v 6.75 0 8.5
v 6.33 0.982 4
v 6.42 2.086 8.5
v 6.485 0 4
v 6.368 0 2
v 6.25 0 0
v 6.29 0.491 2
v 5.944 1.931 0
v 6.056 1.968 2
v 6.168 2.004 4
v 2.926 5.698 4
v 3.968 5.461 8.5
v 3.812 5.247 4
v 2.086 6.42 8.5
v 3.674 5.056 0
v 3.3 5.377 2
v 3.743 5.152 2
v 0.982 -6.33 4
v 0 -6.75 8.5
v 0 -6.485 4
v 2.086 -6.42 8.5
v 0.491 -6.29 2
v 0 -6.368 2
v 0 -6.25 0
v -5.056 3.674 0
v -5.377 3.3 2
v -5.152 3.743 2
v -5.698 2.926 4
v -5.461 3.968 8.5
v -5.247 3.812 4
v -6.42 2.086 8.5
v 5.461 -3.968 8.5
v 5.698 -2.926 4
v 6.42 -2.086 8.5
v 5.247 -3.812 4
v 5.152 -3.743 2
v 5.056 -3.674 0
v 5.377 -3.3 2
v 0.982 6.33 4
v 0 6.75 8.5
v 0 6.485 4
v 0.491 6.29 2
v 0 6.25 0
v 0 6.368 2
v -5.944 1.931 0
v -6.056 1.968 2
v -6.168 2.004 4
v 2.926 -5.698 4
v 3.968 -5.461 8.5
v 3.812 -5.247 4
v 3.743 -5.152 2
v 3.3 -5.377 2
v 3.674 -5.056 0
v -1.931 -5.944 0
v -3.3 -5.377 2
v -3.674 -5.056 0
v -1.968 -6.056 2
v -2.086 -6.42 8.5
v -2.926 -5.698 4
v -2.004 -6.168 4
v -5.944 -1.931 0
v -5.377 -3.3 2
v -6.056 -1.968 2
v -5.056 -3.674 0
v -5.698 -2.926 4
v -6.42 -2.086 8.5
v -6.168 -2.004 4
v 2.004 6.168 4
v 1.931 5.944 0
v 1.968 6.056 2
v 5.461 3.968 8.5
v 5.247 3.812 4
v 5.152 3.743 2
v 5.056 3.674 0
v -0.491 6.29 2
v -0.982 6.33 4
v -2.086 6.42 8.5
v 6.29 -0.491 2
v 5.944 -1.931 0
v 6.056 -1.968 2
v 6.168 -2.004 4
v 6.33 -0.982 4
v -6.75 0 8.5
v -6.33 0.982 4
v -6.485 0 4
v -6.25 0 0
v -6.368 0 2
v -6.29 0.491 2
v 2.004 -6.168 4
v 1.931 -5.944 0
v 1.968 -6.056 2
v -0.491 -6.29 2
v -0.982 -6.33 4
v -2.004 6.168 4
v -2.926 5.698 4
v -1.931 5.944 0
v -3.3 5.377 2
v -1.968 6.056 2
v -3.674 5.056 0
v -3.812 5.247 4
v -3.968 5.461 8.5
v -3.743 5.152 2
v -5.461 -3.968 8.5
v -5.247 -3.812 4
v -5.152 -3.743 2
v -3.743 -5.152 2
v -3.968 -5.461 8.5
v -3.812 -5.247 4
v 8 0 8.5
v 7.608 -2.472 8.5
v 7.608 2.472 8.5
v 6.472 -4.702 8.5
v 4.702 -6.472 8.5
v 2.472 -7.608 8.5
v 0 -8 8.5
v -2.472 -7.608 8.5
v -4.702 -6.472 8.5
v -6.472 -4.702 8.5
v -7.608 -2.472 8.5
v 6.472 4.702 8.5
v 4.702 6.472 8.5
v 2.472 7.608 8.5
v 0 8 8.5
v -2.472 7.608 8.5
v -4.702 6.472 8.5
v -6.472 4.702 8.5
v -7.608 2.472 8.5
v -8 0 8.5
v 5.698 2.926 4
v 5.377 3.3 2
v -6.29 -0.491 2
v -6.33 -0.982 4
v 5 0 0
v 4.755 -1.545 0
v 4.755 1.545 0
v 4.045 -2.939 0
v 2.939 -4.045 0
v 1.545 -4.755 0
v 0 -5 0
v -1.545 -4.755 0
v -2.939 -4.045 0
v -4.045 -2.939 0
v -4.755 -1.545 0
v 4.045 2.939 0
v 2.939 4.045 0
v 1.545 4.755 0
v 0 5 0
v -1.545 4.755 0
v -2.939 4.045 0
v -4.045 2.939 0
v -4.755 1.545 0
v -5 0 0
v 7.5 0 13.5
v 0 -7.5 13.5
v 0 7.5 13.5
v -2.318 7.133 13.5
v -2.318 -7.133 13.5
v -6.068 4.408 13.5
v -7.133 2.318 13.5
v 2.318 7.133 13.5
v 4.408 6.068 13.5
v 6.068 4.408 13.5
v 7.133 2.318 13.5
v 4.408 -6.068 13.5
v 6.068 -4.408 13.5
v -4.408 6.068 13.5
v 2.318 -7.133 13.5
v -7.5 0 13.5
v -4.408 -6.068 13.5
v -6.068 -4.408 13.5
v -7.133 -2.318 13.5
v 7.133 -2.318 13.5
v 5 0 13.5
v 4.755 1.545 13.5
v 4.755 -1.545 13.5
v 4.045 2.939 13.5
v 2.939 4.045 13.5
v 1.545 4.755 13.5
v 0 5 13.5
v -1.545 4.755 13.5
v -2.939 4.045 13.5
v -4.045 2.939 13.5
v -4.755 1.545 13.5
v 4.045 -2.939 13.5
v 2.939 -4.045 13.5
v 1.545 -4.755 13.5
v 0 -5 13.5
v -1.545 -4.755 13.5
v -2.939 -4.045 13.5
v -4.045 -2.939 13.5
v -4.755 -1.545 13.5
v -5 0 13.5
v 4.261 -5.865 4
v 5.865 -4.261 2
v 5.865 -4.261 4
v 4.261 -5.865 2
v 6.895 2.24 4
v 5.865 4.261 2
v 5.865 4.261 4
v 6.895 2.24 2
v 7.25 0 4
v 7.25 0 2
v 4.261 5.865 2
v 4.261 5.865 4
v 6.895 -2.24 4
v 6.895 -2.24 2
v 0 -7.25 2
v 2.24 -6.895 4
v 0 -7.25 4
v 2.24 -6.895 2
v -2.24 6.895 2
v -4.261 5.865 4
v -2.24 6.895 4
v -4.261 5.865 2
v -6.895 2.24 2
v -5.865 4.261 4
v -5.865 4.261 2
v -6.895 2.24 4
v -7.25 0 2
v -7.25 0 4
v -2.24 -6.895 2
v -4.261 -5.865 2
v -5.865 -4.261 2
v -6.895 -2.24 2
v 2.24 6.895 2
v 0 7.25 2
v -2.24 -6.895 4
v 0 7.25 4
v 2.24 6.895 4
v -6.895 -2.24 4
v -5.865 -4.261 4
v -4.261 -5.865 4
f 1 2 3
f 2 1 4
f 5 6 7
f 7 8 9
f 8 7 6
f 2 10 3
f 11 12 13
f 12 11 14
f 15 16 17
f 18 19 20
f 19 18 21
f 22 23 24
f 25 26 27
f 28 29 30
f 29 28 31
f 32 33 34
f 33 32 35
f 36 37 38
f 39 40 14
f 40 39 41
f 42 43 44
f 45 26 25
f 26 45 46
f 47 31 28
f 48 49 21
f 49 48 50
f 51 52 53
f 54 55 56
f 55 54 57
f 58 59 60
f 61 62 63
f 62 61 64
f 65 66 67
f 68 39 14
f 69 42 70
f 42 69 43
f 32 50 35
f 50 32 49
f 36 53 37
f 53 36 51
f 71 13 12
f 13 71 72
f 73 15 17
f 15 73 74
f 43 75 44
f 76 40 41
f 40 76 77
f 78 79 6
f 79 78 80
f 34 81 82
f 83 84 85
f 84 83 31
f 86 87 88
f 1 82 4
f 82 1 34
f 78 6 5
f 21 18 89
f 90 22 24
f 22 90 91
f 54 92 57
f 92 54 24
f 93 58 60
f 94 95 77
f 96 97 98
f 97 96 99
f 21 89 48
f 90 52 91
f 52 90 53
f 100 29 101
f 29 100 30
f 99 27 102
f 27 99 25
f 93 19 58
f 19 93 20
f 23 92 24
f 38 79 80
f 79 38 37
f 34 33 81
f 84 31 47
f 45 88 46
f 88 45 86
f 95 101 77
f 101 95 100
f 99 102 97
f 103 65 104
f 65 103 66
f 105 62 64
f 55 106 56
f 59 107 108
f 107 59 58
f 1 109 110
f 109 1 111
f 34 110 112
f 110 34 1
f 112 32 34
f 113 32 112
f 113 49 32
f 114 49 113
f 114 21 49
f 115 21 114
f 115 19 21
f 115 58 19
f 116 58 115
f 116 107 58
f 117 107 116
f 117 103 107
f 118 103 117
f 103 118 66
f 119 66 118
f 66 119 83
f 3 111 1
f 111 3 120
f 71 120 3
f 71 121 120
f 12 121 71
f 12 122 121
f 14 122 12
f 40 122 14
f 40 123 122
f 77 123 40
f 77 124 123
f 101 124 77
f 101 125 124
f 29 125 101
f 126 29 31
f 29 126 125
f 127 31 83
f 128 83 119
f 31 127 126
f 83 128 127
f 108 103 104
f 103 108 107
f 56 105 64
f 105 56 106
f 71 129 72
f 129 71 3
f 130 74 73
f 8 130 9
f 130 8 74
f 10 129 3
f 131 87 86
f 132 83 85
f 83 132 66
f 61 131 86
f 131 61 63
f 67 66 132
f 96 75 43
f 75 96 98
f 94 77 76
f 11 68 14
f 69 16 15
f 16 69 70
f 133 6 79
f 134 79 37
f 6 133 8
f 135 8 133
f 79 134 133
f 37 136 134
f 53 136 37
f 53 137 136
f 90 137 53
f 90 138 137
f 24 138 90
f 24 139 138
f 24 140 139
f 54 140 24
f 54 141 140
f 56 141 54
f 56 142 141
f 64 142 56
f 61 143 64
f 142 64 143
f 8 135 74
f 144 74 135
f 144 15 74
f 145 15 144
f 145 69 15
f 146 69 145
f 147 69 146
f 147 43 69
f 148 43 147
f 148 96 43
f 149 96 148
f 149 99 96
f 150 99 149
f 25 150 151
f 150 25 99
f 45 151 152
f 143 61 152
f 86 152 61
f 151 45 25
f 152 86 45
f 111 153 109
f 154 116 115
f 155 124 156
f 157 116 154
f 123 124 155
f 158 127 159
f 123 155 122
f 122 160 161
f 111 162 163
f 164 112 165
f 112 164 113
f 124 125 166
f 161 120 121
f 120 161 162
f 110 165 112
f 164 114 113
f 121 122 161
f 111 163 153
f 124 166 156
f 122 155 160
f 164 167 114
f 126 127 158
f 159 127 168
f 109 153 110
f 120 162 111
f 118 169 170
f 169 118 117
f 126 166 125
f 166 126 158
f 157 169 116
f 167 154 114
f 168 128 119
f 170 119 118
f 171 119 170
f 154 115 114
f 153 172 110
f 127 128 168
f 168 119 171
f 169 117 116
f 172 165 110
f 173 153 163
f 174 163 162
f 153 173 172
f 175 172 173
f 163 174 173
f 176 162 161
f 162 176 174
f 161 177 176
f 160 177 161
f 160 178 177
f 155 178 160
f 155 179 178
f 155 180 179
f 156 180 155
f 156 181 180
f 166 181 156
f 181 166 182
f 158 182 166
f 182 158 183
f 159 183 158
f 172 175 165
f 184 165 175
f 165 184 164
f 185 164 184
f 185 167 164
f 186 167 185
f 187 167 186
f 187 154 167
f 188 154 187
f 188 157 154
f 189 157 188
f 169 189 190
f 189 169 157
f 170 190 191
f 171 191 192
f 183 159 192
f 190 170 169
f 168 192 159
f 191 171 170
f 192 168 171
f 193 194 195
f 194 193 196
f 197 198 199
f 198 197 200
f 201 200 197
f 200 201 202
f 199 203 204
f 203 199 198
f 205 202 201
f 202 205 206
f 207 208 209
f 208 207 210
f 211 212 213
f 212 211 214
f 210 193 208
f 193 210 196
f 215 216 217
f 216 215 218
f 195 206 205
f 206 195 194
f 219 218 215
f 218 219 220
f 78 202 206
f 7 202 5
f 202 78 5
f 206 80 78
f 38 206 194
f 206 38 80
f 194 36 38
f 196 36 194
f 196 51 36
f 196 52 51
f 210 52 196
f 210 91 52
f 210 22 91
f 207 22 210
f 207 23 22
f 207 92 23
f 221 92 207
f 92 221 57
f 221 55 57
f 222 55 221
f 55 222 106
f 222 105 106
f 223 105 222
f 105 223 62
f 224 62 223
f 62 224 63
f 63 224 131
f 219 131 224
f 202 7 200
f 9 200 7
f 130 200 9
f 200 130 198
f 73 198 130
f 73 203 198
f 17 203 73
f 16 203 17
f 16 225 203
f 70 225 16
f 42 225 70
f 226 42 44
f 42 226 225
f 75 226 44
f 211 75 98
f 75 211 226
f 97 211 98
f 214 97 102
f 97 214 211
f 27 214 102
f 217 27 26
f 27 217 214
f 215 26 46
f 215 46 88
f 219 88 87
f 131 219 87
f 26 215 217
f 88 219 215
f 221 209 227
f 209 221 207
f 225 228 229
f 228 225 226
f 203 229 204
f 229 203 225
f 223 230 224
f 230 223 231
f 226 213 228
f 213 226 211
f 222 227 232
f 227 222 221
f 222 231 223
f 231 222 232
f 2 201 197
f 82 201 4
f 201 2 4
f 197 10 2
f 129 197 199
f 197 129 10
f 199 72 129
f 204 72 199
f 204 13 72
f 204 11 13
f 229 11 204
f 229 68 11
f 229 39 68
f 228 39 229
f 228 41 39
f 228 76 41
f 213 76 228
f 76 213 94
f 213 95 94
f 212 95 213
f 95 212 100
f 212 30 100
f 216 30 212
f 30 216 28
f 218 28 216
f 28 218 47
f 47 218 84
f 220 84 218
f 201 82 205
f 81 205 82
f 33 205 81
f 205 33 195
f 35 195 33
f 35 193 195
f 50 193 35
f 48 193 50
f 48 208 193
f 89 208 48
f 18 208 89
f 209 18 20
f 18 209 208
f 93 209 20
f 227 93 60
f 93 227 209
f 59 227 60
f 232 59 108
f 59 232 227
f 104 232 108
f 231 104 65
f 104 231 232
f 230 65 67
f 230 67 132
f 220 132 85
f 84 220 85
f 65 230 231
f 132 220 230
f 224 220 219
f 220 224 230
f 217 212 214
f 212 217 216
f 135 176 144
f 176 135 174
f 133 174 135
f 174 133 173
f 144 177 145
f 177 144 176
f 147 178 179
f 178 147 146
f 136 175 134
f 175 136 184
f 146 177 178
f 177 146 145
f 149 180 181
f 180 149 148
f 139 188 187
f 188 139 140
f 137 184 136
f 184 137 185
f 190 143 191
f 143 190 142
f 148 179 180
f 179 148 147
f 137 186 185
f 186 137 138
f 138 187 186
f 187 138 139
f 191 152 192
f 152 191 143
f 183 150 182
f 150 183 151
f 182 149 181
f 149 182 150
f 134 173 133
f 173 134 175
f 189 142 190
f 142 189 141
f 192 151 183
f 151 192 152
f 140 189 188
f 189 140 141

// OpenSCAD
// openNSP_project, mounts section version 1.0
// Zexuan Qiao, 2024
// under GPL license ver3

mountLOA = 13.5; //.1
bore = 10; //.1
mainDiameter = 12.5; //.1
bellDiameter = 16; //.1
bell = 5; //.1
endOffset = 1; //.1
decoration = 2; //.1
decoPos = 2; //.1

decoDiameter = mainDiameter + 2;

/* [Utilities] */
// Segments, the higher the value, the smoother the surface would be.
$fn = 20;

difference(){
union(){
cylinder(h = mountLOA - bell, d1 = mainDiameter, d2 = mainDiameter + endOffset);
translate([0,0,mountLOA - bell]) cylinder(h = bell, d1 = bellDiameter, d2 = bellDiameter - endOffset);
translate([0,0,decoPos]) cylinder(h = decoration, d = decoDiameter);
}
cylinder(h = mountLOA, d = bore);
}
